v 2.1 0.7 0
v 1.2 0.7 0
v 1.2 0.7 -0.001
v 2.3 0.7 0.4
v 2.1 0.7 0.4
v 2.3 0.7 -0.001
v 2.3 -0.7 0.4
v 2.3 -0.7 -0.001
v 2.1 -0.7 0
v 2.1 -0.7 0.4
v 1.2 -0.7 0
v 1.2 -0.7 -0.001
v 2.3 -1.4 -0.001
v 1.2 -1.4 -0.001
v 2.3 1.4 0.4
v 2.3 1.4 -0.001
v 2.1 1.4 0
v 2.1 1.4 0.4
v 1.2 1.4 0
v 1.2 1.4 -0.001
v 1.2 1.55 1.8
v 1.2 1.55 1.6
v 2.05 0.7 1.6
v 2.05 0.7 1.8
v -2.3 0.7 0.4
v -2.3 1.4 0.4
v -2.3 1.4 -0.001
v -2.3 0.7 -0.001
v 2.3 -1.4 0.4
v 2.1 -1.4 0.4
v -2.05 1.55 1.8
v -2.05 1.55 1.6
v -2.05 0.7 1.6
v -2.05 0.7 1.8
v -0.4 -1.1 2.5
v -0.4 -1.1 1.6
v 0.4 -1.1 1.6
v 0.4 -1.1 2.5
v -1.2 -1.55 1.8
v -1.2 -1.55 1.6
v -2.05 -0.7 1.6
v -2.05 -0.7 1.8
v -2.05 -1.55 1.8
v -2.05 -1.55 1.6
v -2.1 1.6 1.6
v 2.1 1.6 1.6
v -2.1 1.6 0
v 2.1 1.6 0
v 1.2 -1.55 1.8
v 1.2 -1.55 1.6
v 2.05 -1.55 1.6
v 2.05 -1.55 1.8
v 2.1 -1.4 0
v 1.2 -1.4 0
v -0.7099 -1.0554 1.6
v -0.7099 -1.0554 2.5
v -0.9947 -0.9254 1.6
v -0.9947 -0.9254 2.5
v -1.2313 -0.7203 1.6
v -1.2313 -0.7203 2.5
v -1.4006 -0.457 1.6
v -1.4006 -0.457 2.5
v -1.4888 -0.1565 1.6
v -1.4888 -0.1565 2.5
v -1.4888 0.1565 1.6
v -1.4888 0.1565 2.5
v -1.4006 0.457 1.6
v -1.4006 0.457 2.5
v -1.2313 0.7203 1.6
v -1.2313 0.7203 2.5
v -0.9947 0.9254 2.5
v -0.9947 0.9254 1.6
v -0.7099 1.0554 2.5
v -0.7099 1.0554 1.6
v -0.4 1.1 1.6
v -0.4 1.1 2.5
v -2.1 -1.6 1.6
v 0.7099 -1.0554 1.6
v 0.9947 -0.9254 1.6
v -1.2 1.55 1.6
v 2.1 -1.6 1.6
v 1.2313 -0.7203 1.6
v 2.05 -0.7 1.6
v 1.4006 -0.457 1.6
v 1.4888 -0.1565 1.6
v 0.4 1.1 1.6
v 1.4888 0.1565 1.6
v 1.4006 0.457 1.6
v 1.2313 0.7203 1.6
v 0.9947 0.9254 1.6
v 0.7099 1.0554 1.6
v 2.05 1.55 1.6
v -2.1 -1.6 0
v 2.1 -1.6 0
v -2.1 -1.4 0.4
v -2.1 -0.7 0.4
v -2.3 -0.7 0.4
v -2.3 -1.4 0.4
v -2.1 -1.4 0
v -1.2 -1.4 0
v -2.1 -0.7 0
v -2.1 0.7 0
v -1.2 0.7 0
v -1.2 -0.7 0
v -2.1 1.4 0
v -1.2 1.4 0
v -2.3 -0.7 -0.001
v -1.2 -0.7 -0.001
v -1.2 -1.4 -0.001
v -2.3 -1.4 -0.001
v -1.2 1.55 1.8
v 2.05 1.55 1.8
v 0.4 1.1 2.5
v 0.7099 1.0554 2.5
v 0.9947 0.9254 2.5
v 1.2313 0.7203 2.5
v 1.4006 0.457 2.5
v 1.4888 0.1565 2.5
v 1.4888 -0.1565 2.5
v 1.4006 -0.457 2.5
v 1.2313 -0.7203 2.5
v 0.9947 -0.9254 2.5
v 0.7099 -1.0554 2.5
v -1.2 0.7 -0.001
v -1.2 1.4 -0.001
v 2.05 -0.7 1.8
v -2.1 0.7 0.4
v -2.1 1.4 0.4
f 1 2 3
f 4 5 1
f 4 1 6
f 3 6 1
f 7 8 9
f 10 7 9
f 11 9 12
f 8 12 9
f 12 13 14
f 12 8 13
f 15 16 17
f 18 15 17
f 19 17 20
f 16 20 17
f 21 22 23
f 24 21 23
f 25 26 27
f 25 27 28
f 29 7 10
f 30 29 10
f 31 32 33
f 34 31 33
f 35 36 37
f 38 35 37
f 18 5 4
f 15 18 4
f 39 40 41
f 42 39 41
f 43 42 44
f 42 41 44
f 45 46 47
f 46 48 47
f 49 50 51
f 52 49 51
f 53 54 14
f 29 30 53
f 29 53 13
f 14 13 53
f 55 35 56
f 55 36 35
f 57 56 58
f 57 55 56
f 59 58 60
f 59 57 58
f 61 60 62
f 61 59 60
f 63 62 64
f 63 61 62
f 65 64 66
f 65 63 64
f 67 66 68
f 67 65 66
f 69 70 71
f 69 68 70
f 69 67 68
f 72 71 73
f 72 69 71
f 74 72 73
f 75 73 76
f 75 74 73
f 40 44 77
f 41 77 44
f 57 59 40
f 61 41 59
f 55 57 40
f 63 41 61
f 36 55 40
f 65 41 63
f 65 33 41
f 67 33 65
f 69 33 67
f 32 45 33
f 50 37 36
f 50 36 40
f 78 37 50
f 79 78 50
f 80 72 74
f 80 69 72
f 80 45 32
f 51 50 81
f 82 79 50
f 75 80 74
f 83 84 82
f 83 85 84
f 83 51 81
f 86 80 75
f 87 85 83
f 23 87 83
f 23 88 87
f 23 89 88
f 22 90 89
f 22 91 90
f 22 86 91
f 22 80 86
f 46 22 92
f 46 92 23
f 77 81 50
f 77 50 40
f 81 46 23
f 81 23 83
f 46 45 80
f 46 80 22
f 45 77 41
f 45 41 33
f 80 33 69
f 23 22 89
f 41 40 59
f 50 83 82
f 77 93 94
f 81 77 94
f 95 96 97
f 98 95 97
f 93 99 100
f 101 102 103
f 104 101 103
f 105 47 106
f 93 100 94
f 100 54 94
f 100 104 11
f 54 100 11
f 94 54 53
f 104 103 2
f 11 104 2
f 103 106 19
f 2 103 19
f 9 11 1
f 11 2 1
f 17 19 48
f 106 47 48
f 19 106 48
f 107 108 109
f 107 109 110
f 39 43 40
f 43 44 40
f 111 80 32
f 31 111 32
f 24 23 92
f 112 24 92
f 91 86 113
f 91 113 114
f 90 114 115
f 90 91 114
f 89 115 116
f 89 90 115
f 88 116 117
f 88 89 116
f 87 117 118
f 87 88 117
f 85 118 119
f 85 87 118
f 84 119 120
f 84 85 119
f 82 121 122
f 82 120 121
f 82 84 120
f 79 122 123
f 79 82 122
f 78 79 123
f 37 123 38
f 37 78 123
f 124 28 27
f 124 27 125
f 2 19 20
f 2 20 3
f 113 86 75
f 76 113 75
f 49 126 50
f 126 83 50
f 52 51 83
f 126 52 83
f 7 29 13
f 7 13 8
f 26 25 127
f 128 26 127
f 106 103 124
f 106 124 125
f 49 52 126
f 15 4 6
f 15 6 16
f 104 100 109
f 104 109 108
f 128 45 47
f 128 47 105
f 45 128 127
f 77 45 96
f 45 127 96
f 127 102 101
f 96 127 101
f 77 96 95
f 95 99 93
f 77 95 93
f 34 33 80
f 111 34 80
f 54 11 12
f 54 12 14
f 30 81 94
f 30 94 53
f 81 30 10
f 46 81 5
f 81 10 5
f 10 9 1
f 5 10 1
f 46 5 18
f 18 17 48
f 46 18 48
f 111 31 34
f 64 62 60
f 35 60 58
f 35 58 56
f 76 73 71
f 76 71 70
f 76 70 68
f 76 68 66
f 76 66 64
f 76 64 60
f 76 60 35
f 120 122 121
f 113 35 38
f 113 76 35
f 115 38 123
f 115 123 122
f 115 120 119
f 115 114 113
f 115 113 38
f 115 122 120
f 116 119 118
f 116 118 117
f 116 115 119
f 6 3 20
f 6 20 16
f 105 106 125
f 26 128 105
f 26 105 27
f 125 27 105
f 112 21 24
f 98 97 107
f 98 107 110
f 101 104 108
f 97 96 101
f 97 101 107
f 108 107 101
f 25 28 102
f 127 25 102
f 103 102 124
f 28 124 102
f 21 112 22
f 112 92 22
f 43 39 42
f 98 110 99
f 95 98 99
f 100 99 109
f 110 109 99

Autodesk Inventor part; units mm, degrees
ref_plane "YZ Plane" through (0, 0, 0) normal (1, 0, 0) x (0, 1, 0)
ref_plane "XZ Plane" through (0, 0, 0) normal (0, 1, 0) x (-1, 0, 0)
ref_plane "XY Plane" through (0, 0, 0) normal (0, 0, 1) x (1, 0, 0)
sketch "スケッチ1" plane through (0, 0, 0) normal (0, 0, 1) x (1, 0, 0)
  line L0 (-2.1, -1.6) -> (2.1, -1.6)
  line L1 (2.1, -1.6) -> (2.1, 1.6)
  line L2 (2.1, 1.6) -> (-2.1, 1.6)
  line L3 (-2.1, 1.6) -> (-2.1, -1.6)
  line L4 (-2.1, -1.6) -> (2.1, 1.6) construction
  line L5 (2.1, -1.6) -> (-2.1, 1.6) construction
  point P0 (0, 0)
  point P1 (0, 0)
  point P2 (0, 0)
  dimension "d0" = 4.2
  dimension "d1" = 3.2
extrude "押し出し1" add sketch "スケッチ1" along normal blind 1.6
sketch "スケッチ2" plane through (0, 0, 1.6) normal (0, 0, 1) x (1, 0, 0)
  line L0 (-0.4, 0) -> (0.4, 0) construction
  line L1 (-0.4, -1.1) -> (0.4, -1.1)
  line L2 (0.4, 1.1) -> (-0.4, 1.1)
  arc A0 (-0.4, 1.1) -> (-0.4, -1.1) centre (-0.4, 0) ccw
  arc A1 (0.4, -1.1) -> (0.4, 1.1) centre (0.4, 0) ccw
  point P0 (0, 0)
  point P1 (0, 0)
  dimension "d4" = 2.2
  dimension "d5" = 3
extrude "押し出し2" add sketch "スケッチ2" along normal blind 0.9
sketch "スケッチ3" plane through (0, 0, 1.6) normal (0, 0, 1) x (1, 0, 0)
  line L0 (-2.05, 1.55) -> (-2.05, 0.7)
  line L1 (-2.05, 0.7) -> (-1.2, 1.55)
  line L2 (-1.2, 1.55) -> (-2.05, 1.55)
  line L3 (2.1, 1.6) -> (-2.1, 1.6) projected
  line L4 (-2.1, 1.6) -> (-2.1, -1.6) projected
  point P0 (0, 0)
  dimension "d8" = 0.05
  dimension "d9" = 0.05
  dimension "d10" = 0.7
extrude "押し出し3" add sketch "スケッチ3" along normal blind 0.2
mirror "ミラー1" about plane through (0, 0, 0) normal (1, 0, 0) of "押し出し3"
mirror "ミラー2" about plane through (0, 0, 0) normal (0, 1, 0) of "押し出し3", "ミラー1"
sketch "スケッチ4" plane through (0, 0, 0) normal (0, 0, -1) x (-1, 0, 0)
  line L0 (2.3, -1.4) -> (1.2, -1.4)
  line L1 (1.2, -1.4) -> (1.2, -0.7)
  line L2 (1.2, -0.7) -> (2.3, -0.7)
  line L3 (2.3, -0.7) -> (2.3, -1.4)
  line L4 (0, 2.24) -> (0, -2.24) projected
  line L5 (2.1, -1.6) -> (-2.1, -1.6) projected
  line L6 (2.1, 1.6) -> (2.1, -1.6) projected
  point P0 (0, 0)
  dimension "d13" = 2.3
  dimension "d14" = 0.7
  dimension "d15" = 0.2
  dimension "d16" = 0.9
extrude "押し出し4" add sketch "スケッチ4" along normal blind 0.001 and the other way blind 0.4
mirror "ミラー3" about plane through (0, 0, 0) normal (-1, 0, 0) of "押し出し4"
mirror "ミラー4" about plane through (0, 0, 0) normal (0, 1, 0) of "押し出し4", "ミラー3"
ref_plane "作業平面1" through (0, 0, 0) normal (1, 0, 0) x (0, 1, 0)
ref_plane "作業平面2" through (0, 0, 0) normal (-1, 0, 0) x (0, -1, 0)
ref_plane "作業平面3" through (0, 0, 0) normal (-1, 0, 0) x (0, -1, 0)
properties part number "Circuit_TactSwitch_SKRPACE010"
